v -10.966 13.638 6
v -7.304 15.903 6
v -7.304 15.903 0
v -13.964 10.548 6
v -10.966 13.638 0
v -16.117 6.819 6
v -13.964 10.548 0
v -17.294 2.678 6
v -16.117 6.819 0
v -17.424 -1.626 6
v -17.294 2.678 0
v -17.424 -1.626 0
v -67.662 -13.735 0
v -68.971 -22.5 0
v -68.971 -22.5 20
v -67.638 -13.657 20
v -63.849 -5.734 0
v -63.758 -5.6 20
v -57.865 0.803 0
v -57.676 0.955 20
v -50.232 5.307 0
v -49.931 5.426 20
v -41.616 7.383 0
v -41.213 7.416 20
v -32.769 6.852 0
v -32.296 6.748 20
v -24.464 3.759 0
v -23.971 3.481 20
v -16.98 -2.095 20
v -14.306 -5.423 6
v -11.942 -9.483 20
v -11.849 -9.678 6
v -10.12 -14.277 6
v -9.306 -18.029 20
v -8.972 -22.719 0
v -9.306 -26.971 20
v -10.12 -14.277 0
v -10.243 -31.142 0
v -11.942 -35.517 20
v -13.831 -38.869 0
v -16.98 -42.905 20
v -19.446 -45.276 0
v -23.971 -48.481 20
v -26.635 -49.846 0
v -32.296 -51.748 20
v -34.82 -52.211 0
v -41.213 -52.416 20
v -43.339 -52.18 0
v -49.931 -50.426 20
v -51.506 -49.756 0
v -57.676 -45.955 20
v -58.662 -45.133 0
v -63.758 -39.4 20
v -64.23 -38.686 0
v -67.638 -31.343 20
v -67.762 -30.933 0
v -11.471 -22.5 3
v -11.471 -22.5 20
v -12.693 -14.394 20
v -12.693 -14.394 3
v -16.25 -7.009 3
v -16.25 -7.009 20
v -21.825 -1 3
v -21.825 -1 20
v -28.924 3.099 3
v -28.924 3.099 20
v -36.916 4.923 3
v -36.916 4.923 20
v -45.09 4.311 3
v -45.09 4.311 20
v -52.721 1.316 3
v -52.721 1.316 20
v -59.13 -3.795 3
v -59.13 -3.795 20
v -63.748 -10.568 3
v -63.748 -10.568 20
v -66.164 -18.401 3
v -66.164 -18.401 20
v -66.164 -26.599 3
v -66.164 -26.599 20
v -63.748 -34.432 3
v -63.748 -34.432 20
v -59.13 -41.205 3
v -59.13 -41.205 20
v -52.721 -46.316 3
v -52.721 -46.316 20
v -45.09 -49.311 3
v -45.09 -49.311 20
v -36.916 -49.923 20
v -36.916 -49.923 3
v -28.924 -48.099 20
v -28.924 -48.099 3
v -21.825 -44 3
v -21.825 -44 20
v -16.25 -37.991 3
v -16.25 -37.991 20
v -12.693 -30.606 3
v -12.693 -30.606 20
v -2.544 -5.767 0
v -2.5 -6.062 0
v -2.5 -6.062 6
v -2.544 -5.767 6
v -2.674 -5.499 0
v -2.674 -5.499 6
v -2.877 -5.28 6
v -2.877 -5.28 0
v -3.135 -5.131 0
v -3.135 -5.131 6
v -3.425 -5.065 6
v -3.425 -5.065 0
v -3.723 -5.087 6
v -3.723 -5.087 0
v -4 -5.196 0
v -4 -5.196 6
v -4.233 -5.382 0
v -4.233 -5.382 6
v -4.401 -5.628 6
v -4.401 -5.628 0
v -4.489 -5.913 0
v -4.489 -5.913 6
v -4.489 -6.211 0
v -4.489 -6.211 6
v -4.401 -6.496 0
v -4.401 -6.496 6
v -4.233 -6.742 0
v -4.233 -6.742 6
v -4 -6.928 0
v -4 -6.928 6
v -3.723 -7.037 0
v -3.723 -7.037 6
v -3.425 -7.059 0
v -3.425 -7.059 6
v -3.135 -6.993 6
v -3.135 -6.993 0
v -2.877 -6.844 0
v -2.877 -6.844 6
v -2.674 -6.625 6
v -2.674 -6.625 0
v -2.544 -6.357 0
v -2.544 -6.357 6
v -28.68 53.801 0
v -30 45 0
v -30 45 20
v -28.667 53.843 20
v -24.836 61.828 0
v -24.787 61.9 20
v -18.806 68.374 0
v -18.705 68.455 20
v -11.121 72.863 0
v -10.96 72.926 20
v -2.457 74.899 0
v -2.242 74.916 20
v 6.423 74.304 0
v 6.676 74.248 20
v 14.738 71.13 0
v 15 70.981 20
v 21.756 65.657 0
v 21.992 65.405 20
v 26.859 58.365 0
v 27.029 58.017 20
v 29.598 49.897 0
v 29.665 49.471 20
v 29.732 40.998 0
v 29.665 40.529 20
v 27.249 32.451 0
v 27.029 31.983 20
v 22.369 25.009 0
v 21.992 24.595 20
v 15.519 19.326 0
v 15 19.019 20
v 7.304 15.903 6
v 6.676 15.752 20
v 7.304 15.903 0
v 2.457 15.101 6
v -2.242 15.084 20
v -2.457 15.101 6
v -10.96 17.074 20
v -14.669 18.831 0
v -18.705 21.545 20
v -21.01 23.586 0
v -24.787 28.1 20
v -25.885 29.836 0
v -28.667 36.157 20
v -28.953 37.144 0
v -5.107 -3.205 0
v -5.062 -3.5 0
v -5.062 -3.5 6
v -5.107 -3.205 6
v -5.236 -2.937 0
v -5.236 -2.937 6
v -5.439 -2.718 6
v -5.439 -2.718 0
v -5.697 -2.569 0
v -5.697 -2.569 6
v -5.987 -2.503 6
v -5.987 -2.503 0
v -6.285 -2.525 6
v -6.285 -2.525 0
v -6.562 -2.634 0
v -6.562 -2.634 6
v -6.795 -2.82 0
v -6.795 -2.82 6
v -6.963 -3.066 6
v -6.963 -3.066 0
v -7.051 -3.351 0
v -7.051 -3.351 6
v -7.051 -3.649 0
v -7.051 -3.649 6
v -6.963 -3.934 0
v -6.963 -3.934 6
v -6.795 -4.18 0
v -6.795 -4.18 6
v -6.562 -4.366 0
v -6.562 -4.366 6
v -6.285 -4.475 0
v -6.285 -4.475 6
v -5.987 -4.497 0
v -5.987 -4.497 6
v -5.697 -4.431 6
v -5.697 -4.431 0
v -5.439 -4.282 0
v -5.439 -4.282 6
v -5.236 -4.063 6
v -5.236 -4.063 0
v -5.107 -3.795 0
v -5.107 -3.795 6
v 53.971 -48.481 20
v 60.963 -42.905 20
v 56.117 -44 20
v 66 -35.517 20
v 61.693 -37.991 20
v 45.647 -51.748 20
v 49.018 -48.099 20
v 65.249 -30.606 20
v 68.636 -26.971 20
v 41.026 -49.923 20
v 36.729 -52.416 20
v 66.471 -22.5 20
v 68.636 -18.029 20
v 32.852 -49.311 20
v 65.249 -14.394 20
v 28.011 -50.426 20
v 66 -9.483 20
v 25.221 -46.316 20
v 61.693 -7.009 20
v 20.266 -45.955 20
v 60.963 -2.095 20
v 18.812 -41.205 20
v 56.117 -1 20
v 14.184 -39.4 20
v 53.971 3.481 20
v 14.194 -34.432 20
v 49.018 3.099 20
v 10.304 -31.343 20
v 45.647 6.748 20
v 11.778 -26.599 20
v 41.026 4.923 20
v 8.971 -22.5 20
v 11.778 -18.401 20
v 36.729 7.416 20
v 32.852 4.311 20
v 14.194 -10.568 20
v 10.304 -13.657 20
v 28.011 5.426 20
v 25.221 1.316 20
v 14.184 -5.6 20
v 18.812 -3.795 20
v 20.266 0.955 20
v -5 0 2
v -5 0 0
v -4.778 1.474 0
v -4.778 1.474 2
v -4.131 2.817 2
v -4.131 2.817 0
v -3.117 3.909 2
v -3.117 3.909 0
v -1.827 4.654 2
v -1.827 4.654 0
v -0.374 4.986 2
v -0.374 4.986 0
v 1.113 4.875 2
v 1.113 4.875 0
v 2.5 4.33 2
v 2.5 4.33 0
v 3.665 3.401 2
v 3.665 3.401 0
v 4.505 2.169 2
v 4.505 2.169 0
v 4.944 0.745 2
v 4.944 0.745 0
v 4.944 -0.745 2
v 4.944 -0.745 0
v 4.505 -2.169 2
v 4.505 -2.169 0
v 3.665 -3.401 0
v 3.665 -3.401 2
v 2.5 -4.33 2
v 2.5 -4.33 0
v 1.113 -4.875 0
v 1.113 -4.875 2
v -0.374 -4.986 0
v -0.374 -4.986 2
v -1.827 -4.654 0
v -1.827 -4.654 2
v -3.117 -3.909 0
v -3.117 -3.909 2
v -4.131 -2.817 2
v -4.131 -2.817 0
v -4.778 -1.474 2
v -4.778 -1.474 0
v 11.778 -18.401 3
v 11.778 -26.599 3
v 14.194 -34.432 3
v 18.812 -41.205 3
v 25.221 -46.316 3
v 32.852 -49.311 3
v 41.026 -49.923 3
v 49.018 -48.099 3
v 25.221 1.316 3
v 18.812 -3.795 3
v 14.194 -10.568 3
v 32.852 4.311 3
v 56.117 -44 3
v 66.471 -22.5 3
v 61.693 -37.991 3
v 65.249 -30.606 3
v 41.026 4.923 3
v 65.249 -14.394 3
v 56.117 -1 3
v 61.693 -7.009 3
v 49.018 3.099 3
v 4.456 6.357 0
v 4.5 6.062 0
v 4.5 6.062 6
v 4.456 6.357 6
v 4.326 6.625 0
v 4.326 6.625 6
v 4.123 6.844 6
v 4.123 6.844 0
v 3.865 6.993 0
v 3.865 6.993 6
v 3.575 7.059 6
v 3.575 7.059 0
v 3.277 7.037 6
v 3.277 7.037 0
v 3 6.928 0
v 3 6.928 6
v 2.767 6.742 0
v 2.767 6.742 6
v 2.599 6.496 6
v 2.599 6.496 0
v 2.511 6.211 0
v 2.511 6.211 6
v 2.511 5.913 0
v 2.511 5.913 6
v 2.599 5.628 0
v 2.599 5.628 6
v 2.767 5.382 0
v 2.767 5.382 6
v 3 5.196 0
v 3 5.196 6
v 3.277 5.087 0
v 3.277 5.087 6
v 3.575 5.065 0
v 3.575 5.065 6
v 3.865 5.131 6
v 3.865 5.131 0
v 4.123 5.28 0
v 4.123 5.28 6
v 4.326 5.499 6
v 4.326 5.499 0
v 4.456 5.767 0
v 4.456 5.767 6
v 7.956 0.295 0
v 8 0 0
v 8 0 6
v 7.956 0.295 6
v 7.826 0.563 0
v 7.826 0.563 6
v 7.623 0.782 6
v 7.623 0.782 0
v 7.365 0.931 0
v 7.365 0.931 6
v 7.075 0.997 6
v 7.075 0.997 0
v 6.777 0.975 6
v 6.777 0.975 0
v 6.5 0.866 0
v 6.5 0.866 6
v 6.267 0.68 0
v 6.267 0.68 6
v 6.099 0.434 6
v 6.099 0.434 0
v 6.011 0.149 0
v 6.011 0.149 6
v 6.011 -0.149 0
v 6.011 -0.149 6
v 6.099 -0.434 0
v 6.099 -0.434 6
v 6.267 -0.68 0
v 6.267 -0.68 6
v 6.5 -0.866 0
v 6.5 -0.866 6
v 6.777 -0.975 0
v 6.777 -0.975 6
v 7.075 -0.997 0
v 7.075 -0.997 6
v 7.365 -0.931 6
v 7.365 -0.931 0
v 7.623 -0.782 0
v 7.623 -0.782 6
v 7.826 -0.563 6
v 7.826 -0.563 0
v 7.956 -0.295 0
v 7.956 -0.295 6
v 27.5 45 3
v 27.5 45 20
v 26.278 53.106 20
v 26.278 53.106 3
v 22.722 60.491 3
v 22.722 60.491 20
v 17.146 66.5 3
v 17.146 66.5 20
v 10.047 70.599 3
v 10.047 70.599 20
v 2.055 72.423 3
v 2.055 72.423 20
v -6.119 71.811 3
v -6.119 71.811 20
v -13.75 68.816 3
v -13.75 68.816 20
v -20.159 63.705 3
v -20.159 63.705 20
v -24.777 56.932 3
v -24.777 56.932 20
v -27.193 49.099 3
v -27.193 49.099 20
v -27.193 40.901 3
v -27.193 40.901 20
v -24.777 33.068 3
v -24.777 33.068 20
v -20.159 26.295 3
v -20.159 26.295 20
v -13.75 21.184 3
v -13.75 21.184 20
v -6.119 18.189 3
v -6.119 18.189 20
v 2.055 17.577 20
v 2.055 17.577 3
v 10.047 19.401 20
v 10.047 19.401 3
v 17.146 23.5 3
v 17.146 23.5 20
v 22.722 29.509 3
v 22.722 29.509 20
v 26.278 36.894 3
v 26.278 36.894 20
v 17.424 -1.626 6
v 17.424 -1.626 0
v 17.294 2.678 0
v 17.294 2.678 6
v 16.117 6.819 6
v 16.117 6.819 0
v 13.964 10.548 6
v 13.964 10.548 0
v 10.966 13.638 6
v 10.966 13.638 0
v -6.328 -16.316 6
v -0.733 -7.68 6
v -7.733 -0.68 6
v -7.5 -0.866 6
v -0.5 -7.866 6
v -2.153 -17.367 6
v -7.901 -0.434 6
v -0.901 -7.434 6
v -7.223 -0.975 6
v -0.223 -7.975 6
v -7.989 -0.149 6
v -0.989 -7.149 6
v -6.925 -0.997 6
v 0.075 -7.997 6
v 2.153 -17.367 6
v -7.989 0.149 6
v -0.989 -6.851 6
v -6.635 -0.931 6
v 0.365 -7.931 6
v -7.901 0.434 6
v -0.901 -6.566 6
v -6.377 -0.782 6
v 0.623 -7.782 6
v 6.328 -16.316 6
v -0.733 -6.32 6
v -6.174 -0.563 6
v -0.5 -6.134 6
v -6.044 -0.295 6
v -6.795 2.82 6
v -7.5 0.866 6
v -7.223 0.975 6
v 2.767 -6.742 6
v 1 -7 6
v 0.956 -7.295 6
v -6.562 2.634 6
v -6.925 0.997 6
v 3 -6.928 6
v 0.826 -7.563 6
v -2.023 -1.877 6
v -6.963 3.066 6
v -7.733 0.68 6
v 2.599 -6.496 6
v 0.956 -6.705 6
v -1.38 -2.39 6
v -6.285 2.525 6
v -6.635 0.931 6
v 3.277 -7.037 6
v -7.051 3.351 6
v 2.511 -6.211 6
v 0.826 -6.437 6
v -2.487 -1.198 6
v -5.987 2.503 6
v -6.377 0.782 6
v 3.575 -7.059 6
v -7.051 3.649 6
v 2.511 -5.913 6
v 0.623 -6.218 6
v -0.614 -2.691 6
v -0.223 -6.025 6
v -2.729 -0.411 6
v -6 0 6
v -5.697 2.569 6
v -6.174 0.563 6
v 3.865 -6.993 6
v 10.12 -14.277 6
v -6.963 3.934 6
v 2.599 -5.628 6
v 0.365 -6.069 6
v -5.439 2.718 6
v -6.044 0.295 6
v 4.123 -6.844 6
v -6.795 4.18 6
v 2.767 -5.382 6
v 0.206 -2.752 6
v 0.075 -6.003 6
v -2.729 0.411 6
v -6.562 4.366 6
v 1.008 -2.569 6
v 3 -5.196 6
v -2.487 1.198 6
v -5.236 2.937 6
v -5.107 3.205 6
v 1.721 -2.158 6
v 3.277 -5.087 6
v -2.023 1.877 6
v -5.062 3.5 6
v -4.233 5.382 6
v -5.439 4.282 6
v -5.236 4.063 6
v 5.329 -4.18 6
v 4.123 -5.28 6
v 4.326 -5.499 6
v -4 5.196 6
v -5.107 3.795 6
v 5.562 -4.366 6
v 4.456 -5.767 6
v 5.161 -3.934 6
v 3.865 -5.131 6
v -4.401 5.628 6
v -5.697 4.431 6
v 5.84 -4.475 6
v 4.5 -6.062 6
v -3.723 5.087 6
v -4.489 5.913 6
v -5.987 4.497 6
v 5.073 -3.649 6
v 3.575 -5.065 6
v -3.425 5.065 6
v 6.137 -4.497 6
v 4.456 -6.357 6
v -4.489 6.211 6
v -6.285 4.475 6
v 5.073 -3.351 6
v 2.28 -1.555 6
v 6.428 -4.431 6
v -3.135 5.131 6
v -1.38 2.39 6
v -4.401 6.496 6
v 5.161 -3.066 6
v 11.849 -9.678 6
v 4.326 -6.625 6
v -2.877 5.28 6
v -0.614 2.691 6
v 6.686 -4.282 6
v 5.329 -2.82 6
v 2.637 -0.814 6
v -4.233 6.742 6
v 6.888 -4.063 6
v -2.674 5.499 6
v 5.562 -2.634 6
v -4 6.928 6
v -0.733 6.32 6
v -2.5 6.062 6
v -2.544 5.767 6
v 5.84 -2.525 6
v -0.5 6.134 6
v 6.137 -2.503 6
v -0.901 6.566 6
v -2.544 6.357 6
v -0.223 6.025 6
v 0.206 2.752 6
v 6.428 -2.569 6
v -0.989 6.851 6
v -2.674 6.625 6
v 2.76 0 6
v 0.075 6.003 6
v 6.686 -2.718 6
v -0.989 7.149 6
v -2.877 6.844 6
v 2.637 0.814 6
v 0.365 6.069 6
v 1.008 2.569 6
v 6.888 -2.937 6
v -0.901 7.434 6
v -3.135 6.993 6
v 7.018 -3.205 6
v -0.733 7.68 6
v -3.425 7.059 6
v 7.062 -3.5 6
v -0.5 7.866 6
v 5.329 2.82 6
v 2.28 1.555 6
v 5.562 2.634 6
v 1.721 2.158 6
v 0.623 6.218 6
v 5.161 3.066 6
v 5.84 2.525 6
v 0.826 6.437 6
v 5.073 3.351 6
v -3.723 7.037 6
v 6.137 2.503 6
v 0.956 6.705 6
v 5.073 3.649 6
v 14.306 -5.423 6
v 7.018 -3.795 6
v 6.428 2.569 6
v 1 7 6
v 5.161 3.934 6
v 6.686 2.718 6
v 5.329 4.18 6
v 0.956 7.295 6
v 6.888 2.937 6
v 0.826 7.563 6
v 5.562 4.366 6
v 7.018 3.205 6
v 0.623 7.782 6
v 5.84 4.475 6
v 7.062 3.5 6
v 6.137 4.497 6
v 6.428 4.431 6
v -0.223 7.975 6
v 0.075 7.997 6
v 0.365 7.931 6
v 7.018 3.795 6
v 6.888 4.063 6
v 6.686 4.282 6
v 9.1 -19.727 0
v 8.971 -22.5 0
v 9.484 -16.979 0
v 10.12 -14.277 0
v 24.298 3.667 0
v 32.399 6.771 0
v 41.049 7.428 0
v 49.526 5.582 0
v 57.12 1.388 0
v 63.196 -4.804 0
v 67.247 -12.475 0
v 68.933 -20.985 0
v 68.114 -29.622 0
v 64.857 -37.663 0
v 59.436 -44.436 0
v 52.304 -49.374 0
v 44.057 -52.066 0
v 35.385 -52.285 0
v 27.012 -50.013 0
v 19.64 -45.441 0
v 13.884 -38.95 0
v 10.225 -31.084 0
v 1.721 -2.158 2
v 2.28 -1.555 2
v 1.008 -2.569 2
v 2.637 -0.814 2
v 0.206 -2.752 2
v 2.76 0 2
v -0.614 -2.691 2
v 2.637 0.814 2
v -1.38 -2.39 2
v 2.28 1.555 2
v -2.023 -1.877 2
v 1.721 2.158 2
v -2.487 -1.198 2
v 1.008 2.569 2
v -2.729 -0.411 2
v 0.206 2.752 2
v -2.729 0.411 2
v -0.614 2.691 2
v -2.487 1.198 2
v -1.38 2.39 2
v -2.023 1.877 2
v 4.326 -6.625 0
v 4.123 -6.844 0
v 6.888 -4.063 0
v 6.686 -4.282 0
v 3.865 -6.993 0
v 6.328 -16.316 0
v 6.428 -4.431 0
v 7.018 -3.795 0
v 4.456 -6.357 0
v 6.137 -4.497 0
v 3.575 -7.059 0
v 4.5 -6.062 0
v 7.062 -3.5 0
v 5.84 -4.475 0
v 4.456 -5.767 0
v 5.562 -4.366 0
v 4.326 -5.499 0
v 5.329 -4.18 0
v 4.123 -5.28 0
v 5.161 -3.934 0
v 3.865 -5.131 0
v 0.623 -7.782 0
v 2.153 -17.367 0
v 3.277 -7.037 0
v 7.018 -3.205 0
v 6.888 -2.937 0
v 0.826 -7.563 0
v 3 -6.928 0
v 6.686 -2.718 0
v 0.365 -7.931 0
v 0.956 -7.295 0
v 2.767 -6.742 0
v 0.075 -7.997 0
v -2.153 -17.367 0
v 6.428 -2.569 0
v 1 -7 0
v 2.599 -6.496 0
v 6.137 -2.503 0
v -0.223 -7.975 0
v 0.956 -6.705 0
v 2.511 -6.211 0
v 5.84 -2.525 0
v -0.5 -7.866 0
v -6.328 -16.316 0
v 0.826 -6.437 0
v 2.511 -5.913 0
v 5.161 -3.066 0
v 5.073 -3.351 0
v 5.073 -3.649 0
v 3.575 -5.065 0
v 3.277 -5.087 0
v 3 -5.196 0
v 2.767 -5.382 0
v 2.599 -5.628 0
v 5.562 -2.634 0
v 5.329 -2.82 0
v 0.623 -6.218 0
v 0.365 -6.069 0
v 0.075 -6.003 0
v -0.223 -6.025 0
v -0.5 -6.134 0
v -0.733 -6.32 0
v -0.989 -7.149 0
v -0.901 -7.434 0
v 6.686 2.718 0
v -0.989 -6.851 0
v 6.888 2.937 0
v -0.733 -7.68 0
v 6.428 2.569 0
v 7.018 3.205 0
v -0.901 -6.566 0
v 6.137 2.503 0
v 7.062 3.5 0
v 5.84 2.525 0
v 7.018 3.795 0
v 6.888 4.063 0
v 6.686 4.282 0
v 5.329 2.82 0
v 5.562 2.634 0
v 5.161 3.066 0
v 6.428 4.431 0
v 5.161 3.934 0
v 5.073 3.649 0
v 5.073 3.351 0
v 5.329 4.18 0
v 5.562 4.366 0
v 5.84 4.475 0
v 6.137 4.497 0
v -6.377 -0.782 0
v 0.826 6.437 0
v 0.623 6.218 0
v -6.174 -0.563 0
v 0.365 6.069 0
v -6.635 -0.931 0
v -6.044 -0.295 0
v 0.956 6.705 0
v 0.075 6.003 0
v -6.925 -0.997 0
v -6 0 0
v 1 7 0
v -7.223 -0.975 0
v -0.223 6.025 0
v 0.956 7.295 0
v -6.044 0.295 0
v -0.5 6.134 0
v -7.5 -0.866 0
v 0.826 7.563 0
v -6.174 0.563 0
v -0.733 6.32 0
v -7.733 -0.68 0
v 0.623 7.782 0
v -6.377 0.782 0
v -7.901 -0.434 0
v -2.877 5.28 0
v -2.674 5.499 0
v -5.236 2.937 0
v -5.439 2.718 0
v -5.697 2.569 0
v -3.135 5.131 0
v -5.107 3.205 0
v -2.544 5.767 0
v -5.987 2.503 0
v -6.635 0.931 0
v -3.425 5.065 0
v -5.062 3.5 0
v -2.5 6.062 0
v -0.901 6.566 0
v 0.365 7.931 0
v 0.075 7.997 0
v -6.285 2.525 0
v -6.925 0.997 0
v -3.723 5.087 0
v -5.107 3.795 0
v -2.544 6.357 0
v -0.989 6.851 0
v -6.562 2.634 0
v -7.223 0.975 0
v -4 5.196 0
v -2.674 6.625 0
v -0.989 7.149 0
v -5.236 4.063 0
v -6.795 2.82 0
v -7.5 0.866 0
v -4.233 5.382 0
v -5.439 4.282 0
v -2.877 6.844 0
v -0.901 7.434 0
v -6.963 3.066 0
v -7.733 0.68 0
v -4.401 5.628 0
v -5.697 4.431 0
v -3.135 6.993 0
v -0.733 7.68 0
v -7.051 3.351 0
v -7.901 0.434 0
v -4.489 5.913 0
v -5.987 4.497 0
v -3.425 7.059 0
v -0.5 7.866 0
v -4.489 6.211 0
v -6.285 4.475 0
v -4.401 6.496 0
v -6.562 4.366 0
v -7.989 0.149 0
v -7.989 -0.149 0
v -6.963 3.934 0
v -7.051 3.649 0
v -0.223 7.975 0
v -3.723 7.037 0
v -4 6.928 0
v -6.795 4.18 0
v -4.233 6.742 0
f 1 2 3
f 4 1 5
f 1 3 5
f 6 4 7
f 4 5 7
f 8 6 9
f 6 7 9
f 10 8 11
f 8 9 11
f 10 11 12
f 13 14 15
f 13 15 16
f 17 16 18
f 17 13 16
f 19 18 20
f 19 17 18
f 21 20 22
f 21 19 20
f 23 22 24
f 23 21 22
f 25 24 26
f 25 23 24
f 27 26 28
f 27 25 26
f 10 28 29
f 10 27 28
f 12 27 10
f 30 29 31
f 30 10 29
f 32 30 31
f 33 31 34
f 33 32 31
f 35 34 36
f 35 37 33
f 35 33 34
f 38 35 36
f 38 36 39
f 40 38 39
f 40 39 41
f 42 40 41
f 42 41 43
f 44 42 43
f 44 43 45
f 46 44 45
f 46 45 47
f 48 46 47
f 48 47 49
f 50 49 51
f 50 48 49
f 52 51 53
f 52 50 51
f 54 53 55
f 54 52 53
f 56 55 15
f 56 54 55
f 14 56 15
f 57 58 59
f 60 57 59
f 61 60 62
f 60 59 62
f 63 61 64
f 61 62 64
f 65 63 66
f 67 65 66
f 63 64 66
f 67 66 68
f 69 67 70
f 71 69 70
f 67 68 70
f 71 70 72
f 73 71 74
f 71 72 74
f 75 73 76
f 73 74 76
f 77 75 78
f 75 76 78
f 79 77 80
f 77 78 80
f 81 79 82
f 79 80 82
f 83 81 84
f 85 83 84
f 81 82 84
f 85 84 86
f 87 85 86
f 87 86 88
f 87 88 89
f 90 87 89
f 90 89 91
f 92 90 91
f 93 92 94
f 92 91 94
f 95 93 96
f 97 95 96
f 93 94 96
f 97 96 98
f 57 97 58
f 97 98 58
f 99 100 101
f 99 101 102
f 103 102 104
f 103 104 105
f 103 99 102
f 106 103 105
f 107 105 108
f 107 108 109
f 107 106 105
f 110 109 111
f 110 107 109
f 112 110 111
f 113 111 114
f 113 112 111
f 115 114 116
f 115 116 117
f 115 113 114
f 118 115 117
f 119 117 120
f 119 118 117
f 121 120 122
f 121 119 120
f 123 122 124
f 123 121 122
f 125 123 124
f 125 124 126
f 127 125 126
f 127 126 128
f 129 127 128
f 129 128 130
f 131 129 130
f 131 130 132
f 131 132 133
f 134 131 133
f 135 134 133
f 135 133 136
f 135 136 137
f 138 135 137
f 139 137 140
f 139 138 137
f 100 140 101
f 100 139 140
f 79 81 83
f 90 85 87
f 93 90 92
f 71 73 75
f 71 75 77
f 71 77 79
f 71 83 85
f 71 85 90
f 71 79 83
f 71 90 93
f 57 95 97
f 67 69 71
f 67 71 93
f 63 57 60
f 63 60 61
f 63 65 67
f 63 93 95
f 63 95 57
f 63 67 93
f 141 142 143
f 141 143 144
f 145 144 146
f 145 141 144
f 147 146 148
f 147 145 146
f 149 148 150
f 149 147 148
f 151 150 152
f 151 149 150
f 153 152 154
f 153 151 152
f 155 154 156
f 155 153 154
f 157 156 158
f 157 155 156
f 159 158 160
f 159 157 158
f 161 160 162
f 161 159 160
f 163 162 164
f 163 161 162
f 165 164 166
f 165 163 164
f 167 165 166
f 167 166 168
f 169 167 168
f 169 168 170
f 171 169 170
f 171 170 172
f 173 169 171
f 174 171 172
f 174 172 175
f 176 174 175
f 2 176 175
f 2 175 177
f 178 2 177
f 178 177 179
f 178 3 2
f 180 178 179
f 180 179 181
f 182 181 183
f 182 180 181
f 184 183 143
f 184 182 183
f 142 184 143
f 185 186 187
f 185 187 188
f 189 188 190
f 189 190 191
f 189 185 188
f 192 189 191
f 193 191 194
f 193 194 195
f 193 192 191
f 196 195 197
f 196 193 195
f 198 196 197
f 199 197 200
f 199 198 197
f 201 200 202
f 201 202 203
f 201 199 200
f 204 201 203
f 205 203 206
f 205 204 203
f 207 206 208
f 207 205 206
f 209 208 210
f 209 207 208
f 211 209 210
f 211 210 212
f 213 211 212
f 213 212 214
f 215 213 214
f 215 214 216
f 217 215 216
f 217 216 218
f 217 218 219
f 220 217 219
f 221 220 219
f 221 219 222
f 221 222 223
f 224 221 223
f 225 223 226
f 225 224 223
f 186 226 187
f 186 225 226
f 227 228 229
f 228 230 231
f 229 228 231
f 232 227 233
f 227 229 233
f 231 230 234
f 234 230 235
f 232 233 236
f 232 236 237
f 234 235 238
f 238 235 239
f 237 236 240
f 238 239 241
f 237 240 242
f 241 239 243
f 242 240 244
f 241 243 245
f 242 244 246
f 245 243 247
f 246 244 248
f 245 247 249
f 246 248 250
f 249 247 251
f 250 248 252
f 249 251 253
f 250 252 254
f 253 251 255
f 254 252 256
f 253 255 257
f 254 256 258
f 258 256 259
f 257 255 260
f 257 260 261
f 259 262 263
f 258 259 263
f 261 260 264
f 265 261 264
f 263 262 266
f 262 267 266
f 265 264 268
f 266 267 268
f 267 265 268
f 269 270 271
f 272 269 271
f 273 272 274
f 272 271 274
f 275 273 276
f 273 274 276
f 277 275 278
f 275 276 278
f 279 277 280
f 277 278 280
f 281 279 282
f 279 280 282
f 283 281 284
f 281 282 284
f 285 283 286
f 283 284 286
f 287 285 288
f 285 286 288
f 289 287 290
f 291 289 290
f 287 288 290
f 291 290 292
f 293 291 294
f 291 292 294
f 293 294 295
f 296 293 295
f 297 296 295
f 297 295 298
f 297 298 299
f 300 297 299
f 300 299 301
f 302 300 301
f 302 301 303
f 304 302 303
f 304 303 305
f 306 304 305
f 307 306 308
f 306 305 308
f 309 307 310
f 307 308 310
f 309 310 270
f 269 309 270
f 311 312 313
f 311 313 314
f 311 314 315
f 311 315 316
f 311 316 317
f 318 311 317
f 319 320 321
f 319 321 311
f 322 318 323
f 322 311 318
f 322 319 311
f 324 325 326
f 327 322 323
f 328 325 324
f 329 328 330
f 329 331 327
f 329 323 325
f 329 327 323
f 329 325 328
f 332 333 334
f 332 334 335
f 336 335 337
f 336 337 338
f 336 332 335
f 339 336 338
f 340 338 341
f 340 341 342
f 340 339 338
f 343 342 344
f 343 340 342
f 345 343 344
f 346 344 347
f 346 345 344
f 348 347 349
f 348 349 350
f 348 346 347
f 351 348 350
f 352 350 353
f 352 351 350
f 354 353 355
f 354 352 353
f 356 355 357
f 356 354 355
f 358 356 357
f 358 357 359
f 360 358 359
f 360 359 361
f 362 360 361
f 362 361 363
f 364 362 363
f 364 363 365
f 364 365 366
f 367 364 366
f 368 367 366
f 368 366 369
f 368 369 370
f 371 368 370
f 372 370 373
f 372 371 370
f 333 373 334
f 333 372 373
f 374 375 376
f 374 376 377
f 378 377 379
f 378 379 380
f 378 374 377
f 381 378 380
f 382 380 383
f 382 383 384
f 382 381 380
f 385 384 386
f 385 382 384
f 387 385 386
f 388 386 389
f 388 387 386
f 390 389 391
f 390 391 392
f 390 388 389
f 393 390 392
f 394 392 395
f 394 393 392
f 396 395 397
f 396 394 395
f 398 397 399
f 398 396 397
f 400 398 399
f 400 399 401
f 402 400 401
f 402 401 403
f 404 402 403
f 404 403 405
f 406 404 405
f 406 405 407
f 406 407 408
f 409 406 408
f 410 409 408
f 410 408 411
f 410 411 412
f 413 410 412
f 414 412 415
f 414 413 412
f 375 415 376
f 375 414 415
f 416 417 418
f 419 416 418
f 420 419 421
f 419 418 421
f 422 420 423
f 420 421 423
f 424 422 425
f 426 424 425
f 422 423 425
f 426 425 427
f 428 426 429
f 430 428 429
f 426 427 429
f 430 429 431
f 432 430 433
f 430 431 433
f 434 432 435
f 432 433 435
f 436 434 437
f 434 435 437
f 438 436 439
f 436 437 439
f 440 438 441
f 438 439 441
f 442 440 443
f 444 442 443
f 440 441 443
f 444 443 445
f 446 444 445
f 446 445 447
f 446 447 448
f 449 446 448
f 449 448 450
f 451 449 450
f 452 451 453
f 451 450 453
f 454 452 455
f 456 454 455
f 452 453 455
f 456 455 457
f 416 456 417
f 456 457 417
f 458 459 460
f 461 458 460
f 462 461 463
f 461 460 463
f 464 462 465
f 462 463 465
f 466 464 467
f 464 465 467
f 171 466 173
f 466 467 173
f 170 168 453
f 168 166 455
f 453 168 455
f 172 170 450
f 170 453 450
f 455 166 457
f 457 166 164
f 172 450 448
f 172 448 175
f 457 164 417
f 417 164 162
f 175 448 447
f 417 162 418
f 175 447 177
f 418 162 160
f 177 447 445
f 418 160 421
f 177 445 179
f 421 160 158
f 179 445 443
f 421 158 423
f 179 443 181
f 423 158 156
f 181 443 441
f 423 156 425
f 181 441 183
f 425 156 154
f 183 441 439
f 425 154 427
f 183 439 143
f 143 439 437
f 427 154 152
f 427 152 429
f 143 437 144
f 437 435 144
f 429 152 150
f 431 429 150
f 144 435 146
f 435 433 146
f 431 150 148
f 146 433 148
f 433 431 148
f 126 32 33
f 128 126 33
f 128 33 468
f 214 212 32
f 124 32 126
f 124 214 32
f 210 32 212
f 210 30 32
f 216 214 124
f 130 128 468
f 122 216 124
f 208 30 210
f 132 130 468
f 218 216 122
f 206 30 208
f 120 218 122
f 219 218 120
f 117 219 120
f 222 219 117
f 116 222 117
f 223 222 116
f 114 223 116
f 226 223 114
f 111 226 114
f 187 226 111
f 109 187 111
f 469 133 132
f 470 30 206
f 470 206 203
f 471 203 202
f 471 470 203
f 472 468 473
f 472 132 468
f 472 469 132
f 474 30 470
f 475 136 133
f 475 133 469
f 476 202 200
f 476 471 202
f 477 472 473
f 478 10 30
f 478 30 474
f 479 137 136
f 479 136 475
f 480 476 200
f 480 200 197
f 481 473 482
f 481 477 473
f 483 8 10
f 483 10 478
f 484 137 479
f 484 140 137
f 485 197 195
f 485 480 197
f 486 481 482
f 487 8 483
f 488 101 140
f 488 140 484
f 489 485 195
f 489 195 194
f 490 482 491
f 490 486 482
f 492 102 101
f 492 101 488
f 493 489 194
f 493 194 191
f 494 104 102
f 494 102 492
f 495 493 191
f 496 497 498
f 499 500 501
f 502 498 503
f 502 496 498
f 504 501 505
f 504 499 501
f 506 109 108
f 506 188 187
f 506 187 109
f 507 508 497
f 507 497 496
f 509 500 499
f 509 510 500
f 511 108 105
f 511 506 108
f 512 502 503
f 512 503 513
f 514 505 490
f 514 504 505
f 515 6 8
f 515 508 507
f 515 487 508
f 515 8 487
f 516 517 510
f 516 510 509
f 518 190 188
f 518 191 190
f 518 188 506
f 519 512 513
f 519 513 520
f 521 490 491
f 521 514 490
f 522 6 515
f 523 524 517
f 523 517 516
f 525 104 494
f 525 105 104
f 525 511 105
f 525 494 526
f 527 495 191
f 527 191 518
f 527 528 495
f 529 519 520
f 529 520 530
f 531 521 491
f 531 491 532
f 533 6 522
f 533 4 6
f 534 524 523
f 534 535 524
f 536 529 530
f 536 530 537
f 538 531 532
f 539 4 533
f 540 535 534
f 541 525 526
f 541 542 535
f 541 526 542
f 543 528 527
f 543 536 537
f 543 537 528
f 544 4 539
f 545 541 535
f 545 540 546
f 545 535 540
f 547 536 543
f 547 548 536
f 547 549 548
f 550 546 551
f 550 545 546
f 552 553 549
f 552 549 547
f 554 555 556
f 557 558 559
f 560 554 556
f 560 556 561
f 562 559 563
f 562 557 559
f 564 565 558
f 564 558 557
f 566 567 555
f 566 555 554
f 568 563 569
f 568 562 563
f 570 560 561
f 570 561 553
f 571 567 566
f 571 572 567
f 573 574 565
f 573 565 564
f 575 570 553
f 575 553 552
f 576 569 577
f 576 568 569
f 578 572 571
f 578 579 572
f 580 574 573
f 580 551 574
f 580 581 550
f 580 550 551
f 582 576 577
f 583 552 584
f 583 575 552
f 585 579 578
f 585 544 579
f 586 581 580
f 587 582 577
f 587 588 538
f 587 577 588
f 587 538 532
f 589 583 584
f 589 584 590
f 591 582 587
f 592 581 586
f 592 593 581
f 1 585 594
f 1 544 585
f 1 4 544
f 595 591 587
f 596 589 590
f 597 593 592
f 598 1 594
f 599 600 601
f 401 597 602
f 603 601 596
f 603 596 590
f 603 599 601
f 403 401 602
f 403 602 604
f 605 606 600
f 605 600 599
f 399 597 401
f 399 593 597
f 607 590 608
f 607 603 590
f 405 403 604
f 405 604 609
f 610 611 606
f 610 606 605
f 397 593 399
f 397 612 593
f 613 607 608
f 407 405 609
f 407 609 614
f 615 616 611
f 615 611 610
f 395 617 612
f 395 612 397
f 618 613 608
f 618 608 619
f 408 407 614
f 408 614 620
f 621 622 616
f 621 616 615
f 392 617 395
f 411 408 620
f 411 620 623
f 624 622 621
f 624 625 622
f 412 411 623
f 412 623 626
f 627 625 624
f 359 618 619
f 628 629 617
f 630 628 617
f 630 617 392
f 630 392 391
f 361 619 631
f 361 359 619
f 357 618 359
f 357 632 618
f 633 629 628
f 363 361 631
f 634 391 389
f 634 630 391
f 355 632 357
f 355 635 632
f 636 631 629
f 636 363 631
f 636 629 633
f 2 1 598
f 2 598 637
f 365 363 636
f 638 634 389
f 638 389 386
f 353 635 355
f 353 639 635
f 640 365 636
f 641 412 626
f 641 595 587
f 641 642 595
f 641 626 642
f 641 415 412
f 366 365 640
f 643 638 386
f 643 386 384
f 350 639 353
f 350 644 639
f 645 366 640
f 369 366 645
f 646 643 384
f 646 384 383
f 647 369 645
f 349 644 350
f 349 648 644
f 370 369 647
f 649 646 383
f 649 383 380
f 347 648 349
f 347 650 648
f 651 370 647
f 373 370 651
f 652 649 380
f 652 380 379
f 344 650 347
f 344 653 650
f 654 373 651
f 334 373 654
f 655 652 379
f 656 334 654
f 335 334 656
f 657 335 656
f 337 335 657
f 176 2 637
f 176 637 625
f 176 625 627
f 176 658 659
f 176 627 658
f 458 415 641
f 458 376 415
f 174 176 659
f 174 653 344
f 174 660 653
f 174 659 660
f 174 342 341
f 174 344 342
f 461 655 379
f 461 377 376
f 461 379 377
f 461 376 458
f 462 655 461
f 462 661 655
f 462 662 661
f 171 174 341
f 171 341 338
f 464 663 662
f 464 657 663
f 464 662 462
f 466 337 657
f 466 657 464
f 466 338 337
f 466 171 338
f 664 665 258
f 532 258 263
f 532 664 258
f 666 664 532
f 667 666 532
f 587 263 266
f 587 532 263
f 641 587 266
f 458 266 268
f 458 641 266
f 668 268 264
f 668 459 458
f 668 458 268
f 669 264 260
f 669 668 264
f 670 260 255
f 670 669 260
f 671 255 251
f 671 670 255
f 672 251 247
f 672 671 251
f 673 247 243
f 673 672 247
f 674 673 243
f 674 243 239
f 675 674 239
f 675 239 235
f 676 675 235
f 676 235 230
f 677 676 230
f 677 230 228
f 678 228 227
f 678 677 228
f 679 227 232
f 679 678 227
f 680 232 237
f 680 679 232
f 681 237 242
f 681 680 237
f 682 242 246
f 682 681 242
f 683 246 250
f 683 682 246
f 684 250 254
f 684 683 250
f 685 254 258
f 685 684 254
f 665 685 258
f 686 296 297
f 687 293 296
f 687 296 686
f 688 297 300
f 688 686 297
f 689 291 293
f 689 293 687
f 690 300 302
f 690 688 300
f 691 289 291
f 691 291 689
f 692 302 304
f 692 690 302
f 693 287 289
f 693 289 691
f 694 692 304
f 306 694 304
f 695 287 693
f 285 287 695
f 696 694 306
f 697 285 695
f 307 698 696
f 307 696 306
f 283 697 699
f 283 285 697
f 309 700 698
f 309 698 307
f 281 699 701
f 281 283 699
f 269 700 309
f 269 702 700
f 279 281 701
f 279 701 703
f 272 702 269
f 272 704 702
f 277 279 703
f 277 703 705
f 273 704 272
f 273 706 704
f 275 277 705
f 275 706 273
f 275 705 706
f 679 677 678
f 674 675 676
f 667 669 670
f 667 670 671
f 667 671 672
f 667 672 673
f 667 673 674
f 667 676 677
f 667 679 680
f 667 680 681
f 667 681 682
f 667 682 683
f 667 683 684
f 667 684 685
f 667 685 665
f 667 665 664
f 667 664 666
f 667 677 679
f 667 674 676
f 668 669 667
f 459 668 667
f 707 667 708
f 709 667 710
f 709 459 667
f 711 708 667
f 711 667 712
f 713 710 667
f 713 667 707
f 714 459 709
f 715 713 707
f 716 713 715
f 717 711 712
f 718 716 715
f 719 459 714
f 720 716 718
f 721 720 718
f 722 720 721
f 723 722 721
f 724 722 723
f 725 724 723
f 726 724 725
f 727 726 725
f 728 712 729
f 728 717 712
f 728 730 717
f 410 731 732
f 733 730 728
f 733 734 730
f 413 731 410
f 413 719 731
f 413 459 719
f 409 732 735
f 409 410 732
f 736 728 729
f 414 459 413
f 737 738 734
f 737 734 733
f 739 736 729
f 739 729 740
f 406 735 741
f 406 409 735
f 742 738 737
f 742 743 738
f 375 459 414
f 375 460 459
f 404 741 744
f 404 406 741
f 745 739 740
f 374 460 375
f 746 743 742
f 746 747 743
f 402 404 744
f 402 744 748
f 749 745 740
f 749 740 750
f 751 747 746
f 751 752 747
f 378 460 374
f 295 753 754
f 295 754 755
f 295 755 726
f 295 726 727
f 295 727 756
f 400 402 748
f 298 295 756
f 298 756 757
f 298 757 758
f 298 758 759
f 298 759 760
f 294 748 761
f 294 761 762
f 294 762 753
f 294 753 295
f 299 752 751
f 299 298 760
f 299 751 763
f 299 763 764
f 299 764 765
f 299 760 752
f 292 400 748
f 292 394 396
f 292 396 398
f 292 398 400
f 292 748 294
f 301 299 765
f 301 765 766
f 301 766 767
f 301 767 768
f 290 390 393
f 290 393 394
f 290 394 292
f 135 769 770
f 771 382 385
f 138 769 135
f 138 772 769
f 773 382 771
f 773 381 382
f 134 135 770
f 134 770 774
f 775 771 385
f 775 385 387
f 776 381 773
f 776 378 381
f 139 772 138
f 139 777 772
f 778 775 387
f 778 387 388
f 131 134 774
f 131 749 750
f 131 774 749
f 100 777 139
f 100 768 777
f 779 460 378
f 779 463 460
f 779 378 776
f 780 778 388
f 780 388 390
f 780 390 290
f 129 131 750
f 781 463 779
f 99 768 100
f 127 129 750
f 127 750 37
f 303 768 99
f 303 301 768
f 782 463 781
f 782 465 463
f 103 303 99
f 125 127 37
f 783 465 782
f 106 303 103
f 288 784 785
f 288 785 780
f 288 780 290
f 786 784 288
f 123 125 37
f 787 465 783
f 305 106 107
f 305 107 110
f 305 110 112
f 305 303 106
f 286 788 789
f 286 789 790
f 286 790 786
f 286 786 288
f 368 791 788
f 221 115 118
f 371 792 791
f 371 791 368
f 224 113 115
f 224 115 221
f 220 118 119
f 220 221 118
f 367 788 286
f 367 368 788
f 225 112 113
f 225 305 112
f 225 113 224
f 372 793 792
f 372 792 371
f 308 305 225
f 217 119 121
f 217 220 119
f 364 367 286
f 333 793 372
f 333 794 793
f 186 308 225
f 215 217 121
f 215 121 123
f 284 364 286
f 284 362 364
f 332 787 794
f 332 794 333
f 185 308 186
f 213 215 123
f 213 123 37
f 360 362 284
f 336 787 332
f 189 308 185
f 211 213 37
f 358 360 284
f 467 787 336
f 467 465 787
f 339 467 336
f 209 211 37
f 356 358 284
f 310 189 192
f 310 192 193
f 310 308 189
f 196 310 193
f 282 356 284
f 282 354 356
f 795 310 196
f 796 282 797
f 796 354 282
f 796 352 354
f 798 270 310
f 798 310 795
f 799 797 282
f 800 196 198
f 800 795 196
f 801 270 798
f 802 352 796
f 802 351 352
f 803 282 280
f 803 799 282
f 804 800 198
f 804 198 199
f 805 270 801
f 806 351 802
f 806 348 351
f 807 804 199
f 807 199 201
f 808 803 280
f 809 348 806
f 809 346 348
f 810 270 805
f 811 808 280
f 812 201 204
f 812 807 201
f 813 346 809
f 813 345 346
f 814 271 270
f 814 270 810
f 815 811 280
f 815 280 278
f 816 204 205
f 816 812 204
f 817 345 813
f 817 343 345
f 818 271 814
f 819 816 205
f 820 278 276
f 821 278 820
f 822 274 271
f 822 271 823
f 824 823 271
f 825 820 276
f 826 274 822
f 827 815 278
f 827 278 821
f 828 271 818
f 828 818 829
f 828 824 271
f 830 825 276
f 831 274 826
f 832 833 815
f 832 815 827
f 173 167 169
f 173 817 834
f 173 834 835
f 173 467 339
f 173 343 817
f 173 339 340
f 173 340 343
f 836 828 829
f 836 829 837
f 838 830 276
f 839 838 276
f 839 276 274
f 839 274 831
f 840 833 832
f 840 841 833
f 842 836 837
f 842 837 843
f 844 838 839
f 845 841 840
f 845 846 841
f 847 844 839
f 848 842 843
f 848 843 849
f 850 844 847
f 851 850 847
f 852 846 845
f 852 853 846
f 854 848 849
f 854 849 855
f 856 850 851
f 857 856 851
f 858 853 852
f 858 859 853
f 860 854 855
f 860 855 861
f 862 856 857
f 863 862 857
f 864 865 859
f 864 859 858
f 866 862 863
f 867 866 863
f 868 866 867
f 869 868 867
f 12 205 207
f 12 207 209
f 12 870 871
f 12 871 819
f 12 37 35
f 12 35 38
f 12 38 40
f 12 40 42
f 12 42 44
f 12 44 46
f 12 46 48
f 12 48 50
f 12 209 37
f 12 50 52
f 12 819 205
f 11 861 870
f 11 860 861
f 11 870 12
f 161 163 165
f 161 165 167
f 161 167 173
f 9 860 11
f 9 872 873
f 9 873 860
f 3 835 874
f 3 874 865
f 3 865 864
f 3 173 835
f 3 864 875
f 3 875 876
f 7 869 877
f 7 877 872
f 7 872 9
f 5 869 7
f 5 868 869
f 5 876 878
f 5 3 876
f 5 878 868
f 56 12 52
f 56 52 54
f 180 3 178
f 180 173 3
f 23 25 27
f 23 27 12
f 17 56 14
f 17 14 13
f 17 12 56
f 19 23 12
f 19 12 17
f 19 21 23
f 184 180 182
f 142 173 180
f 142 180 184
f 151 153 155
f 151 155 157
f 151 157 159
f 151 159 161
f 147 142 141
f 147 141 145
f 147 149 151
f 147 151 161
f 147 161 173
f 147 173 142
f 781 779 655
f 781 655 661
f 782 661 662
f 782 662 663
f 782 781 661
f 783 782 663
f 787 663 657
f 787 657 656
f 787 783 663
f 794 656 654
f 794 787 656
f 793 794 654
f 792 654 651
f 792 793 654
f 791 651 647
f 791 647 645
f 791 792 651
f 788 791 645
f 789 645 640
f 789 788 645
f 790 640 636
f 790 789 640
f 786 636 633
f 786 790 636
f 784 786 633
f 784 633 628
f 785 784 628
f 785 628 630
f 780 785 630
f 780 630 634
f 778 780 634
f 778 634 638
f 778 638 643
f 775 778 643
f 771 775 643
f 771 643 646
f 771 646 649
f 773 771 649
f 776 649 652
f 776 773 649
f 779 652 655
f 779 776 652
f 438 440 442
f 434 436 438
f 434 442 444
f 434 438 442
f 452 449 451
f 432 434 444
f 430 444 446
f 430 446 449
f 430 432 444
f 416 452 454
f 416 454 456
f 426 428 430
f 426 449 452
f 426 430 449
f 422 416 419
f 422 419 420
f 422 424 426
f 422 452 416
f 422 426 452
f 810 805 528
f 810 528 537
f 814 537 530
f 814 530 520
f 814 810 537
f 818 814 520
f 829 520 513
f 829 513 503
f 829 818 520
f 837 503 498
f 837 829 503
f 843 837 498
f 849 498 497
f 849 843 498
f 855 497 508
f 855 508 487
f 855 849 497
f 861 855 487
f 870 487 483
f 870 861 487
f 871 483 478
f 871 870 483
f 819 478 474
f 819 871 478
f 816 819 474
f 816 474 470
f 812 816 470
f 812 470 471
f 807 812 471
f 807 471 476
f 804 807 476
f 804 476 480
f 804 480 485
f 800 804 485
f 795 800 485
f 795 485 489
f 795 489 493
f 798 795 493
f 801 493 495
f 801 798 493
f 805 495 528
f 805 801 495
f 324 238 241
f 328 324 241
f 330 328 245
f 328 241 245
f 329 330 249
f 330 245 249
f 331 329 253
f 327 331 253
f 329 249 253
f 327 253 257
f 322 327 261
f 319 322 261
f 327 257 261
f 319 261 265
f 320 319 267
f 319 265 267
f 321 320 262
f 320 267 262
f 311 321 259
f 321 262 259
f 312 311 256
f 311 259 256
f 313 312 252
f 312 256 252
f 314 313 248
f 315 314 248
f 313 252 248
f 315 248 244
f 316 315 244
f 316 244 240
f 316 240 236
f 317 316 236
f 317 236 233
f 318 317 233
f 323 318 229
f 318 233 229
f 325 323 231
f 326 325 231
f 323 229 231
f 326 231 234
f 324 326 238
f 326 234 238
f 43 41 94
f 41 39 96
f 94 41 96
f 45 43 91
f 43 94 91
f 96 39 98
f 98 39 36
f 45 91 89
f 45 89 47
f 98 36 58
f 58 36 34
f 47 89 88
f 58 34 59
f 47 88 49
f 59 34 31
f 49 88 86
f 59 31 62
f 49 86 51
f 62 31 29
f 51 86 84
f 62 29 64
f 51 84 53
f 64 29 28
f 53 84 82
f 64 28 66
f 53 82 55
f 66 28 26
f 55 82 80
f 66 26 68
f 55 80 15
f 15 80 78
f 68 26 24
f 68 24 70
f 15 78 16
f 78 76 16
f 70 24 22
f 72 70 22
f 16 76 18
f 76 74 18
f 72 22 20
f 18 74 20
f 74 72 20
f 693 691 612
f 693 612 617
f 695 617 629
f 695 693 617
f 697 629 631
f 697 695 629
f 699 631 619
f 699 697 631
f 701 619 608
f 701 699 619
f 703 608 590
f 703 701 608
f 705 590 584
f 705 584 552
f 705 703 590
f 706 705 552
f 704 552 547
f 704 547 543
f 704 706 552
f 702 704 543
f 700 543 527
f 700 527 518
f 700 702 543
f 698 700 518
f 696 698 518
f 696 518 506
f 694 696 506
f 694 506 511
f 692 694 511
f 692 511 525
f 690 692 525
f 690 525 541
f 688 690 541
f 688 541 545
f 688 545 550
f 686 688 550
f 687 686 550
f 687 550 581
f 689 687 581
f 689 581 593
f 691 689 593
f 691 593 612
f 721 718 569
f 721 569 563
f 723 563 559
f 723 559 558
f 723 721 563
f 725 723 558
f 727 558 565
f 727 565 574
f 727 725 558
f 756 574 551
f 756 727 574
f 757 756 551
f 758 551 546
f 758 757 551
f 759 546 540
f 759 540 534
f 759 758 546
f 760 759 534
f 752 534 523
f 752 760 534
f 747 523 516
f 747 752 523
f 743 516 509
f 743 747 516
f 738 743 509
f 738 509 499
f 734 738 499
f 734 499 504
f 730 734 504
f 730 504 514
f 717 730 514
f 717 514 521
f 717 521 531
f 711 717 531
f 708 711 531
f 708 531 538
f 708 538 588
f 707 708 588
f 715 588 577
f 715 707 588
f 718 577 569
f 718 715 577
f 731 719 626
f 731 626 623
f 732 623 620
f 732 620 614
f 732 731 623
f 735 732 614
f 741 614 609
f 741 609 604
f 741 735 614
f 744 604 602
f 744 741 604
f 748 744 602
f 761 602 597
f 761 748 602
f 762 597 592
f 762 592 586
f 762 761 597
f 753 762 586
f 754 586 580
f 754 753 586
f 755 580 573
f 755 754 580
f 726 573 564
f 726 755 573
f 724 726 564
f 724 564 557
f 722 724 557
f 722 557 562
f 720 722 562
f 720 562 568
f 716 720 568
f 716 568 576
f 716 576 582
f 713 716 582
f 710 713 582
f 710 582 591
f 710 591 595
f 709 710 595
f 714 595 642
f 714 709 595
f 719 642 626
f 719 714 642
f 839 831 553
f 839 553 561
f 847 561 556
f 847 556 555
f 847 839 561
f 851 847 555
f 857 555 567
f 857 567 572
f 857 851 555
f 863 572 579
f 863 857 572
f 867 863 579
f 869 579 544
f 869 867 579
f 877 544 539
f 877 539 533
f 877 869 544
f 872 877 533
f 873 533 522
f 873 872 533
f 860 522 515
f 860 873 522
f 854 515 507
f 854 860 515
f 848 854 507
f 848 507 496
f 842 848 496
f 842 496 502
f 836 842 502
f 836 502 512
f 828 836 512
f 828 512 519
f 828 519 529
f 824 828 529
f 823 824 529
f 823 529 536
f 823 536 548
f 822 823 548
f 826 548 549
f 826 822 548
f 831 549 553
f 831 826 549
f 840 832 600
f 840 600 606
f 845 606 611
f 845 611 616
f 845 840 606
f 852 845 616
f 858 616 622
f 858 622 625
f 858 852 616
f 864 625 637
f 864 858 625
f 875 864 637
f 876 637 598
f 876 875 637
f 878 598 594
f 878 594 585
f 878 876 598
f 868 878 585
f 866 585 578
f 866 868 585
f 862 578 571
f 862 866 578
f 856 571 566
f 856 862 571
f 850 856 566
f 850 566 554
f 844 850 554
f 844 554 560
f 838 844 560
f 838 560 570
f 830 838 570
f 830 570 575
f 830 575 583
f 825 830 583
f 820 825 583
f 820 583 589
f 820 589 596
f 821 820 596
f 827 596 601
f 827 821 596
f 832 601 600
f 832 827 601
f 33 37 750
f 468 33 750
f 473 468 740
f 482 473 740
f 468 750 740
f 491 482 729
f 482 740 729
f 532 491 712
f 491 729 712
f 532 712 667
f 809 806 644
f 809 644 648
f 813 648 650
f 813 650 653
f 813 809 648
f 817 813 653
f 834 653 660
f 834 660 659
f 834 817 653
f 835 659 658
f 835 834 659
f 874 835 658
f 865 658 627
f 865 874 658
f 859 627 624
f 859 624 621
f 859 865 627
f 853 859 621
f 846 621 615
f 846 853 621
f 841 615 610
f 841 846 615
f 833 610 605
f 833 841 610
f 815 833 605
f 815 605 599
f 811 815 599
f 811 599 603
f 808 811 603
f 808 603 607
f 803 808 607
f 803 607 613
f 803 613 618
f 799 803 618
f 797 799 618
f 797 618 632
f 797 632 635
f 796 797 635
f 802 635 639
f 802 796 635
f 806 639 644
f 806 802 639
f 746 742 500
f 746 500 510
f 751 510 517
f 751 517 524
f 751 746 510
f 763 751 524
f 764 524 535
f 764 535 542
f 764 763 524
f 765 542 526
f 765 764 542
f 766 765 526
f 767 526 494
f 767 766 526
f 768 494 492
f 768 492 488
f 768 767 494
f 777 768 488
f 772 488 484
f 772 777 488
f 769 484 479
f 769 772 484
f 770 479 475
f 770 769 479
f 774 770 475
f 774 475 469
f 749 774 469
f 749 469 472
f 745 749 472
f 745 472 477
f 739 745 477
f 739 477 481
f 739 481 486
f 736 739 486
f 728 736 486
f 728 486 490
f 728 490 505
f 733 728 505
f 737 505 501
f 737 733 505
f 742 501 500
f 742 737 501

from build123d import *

# Parameters (mm, degrees)
SKETCH_1_R          = 17.5
SKETCH_1_R_2        = 1
SKETCH_1_R_3        = 2.759956758
EXTRUDE_1_DEPTH     = 6
SKETCH_2_R          = 5
CUT_EXTRUDE_1_DEPTH = 2
SKETCH_4_R          = 30
EXTRUDE_2_DEPTH     = 20
SKETCH_5_R          = 27.5
CUT_EXTRUDE_2_DEPTH = 17


with BuildPart() as part:
    # 草图1 → 凸台-拉伸1 (new body)
    with BuildSketch(Plane.XY):
        Circle(SKETCH_1_R)
        with Locations((7, 0)):
            Circle(SKETCH_1_R_2, mode=Mode.SUBTRACT)
        with Locations((6.062177826, -3.5)):
            Circle(SKETCH_1_R_2, mode=Mode.SUBTRACT)
        with Locations((3.5, -6.062177826)):
            Circle(SKETCH_1_R_2, mode=Mode.SUBTRACT)
        with Locations((0, -7)):
            Circle(SKETCH_1_R_2, mode=Mode.SUBTRACT)
        with Locations((-3.5, -6.062177826)):
            Circle(SKETCH_1_R_2, mode=Mode.SUBTRACT)
        with Locations((-6.062177826, -3.5)):
            Circle(SKETCH_1_R_2, mode=Mode.SUBTRACT)
        with Locations((-7, 0)):
            Circle(SKETCH_1_R_2, mode=Mode.SUBTRACT)
        with Locations((-6.062177826, 3.5)):
            Circle(SKETCH_1_R_2, mode=Mode.SUBTRACT)
        with Locations((-3.5, 6.062177826)):
            Circle(SKETCH_1_R_2, mode=Mode.SUBTRACT)
        with Locations((0, 7)):
            Circle(SKETCH_1_R_2, mode=Mode.SUBTRACT)
        with Locations((3.5, 6.062177826)):
            Circle(SKETCH_1_R_2, mode=Mode.SUBTRACT)
        with Locations((6.062177826, 3.5)):
            Circle(SKETCH_1_R_2, mode=Mode.SUBTRACT)
        Circle(SKETCH_1_R_3, mode=Mode.SUBTRACT)
    extrude(amount=EXTRUDE_1_DEPTH)

    # 草图2 → 切除-拉伸1 (cut)
    with BuildSketch(Plane(origin=(0, 0, 0), x_dir=(-1, 0, 0), z_dir=(0, 0, -1))):
        Circle(SKETCH_2_R)
    extrude(amount=-CUT_EXTRUDE_1_DEPTH, mode=Mode.SUBTRACT)

    # 草图4 → 凸台-拉伸2 (add)
    with BuildSketch(Plane(origin=(0, 0, 0), x_dir=(-1, 0, 0), z_dir=(0, 0, -1))):
        with Locations((0, 45)):
            Circle(SKETCH_4_R)
        with Locations((38.97114317, -22.5)):
            Circle(SKETCH_4_R)
        with Locations((-38.97114317, -22.5)):
            Circle(SKETCH_4_R)
    extrude(amount=-EXTRUDE_2_DEPTH)

    # 草图5 → 切除-拉伸2 (cut)
    with BuildSketch(Plane.XY.offset(20)):
        with Locations((0, 45)):
            Circle(SKETCH_5_R)
        with Locations((38.97114317, -22.5)):
            Circle(SKETCH_5_R)
        with Locations((-38.97114317, -22.5)):
            Circle(SKETCH_5_R)
    extrude(amount=-CUT_EXTRUDE_2_DEPTH, mode=Mode.SUBTRACT)


solid = part.part
